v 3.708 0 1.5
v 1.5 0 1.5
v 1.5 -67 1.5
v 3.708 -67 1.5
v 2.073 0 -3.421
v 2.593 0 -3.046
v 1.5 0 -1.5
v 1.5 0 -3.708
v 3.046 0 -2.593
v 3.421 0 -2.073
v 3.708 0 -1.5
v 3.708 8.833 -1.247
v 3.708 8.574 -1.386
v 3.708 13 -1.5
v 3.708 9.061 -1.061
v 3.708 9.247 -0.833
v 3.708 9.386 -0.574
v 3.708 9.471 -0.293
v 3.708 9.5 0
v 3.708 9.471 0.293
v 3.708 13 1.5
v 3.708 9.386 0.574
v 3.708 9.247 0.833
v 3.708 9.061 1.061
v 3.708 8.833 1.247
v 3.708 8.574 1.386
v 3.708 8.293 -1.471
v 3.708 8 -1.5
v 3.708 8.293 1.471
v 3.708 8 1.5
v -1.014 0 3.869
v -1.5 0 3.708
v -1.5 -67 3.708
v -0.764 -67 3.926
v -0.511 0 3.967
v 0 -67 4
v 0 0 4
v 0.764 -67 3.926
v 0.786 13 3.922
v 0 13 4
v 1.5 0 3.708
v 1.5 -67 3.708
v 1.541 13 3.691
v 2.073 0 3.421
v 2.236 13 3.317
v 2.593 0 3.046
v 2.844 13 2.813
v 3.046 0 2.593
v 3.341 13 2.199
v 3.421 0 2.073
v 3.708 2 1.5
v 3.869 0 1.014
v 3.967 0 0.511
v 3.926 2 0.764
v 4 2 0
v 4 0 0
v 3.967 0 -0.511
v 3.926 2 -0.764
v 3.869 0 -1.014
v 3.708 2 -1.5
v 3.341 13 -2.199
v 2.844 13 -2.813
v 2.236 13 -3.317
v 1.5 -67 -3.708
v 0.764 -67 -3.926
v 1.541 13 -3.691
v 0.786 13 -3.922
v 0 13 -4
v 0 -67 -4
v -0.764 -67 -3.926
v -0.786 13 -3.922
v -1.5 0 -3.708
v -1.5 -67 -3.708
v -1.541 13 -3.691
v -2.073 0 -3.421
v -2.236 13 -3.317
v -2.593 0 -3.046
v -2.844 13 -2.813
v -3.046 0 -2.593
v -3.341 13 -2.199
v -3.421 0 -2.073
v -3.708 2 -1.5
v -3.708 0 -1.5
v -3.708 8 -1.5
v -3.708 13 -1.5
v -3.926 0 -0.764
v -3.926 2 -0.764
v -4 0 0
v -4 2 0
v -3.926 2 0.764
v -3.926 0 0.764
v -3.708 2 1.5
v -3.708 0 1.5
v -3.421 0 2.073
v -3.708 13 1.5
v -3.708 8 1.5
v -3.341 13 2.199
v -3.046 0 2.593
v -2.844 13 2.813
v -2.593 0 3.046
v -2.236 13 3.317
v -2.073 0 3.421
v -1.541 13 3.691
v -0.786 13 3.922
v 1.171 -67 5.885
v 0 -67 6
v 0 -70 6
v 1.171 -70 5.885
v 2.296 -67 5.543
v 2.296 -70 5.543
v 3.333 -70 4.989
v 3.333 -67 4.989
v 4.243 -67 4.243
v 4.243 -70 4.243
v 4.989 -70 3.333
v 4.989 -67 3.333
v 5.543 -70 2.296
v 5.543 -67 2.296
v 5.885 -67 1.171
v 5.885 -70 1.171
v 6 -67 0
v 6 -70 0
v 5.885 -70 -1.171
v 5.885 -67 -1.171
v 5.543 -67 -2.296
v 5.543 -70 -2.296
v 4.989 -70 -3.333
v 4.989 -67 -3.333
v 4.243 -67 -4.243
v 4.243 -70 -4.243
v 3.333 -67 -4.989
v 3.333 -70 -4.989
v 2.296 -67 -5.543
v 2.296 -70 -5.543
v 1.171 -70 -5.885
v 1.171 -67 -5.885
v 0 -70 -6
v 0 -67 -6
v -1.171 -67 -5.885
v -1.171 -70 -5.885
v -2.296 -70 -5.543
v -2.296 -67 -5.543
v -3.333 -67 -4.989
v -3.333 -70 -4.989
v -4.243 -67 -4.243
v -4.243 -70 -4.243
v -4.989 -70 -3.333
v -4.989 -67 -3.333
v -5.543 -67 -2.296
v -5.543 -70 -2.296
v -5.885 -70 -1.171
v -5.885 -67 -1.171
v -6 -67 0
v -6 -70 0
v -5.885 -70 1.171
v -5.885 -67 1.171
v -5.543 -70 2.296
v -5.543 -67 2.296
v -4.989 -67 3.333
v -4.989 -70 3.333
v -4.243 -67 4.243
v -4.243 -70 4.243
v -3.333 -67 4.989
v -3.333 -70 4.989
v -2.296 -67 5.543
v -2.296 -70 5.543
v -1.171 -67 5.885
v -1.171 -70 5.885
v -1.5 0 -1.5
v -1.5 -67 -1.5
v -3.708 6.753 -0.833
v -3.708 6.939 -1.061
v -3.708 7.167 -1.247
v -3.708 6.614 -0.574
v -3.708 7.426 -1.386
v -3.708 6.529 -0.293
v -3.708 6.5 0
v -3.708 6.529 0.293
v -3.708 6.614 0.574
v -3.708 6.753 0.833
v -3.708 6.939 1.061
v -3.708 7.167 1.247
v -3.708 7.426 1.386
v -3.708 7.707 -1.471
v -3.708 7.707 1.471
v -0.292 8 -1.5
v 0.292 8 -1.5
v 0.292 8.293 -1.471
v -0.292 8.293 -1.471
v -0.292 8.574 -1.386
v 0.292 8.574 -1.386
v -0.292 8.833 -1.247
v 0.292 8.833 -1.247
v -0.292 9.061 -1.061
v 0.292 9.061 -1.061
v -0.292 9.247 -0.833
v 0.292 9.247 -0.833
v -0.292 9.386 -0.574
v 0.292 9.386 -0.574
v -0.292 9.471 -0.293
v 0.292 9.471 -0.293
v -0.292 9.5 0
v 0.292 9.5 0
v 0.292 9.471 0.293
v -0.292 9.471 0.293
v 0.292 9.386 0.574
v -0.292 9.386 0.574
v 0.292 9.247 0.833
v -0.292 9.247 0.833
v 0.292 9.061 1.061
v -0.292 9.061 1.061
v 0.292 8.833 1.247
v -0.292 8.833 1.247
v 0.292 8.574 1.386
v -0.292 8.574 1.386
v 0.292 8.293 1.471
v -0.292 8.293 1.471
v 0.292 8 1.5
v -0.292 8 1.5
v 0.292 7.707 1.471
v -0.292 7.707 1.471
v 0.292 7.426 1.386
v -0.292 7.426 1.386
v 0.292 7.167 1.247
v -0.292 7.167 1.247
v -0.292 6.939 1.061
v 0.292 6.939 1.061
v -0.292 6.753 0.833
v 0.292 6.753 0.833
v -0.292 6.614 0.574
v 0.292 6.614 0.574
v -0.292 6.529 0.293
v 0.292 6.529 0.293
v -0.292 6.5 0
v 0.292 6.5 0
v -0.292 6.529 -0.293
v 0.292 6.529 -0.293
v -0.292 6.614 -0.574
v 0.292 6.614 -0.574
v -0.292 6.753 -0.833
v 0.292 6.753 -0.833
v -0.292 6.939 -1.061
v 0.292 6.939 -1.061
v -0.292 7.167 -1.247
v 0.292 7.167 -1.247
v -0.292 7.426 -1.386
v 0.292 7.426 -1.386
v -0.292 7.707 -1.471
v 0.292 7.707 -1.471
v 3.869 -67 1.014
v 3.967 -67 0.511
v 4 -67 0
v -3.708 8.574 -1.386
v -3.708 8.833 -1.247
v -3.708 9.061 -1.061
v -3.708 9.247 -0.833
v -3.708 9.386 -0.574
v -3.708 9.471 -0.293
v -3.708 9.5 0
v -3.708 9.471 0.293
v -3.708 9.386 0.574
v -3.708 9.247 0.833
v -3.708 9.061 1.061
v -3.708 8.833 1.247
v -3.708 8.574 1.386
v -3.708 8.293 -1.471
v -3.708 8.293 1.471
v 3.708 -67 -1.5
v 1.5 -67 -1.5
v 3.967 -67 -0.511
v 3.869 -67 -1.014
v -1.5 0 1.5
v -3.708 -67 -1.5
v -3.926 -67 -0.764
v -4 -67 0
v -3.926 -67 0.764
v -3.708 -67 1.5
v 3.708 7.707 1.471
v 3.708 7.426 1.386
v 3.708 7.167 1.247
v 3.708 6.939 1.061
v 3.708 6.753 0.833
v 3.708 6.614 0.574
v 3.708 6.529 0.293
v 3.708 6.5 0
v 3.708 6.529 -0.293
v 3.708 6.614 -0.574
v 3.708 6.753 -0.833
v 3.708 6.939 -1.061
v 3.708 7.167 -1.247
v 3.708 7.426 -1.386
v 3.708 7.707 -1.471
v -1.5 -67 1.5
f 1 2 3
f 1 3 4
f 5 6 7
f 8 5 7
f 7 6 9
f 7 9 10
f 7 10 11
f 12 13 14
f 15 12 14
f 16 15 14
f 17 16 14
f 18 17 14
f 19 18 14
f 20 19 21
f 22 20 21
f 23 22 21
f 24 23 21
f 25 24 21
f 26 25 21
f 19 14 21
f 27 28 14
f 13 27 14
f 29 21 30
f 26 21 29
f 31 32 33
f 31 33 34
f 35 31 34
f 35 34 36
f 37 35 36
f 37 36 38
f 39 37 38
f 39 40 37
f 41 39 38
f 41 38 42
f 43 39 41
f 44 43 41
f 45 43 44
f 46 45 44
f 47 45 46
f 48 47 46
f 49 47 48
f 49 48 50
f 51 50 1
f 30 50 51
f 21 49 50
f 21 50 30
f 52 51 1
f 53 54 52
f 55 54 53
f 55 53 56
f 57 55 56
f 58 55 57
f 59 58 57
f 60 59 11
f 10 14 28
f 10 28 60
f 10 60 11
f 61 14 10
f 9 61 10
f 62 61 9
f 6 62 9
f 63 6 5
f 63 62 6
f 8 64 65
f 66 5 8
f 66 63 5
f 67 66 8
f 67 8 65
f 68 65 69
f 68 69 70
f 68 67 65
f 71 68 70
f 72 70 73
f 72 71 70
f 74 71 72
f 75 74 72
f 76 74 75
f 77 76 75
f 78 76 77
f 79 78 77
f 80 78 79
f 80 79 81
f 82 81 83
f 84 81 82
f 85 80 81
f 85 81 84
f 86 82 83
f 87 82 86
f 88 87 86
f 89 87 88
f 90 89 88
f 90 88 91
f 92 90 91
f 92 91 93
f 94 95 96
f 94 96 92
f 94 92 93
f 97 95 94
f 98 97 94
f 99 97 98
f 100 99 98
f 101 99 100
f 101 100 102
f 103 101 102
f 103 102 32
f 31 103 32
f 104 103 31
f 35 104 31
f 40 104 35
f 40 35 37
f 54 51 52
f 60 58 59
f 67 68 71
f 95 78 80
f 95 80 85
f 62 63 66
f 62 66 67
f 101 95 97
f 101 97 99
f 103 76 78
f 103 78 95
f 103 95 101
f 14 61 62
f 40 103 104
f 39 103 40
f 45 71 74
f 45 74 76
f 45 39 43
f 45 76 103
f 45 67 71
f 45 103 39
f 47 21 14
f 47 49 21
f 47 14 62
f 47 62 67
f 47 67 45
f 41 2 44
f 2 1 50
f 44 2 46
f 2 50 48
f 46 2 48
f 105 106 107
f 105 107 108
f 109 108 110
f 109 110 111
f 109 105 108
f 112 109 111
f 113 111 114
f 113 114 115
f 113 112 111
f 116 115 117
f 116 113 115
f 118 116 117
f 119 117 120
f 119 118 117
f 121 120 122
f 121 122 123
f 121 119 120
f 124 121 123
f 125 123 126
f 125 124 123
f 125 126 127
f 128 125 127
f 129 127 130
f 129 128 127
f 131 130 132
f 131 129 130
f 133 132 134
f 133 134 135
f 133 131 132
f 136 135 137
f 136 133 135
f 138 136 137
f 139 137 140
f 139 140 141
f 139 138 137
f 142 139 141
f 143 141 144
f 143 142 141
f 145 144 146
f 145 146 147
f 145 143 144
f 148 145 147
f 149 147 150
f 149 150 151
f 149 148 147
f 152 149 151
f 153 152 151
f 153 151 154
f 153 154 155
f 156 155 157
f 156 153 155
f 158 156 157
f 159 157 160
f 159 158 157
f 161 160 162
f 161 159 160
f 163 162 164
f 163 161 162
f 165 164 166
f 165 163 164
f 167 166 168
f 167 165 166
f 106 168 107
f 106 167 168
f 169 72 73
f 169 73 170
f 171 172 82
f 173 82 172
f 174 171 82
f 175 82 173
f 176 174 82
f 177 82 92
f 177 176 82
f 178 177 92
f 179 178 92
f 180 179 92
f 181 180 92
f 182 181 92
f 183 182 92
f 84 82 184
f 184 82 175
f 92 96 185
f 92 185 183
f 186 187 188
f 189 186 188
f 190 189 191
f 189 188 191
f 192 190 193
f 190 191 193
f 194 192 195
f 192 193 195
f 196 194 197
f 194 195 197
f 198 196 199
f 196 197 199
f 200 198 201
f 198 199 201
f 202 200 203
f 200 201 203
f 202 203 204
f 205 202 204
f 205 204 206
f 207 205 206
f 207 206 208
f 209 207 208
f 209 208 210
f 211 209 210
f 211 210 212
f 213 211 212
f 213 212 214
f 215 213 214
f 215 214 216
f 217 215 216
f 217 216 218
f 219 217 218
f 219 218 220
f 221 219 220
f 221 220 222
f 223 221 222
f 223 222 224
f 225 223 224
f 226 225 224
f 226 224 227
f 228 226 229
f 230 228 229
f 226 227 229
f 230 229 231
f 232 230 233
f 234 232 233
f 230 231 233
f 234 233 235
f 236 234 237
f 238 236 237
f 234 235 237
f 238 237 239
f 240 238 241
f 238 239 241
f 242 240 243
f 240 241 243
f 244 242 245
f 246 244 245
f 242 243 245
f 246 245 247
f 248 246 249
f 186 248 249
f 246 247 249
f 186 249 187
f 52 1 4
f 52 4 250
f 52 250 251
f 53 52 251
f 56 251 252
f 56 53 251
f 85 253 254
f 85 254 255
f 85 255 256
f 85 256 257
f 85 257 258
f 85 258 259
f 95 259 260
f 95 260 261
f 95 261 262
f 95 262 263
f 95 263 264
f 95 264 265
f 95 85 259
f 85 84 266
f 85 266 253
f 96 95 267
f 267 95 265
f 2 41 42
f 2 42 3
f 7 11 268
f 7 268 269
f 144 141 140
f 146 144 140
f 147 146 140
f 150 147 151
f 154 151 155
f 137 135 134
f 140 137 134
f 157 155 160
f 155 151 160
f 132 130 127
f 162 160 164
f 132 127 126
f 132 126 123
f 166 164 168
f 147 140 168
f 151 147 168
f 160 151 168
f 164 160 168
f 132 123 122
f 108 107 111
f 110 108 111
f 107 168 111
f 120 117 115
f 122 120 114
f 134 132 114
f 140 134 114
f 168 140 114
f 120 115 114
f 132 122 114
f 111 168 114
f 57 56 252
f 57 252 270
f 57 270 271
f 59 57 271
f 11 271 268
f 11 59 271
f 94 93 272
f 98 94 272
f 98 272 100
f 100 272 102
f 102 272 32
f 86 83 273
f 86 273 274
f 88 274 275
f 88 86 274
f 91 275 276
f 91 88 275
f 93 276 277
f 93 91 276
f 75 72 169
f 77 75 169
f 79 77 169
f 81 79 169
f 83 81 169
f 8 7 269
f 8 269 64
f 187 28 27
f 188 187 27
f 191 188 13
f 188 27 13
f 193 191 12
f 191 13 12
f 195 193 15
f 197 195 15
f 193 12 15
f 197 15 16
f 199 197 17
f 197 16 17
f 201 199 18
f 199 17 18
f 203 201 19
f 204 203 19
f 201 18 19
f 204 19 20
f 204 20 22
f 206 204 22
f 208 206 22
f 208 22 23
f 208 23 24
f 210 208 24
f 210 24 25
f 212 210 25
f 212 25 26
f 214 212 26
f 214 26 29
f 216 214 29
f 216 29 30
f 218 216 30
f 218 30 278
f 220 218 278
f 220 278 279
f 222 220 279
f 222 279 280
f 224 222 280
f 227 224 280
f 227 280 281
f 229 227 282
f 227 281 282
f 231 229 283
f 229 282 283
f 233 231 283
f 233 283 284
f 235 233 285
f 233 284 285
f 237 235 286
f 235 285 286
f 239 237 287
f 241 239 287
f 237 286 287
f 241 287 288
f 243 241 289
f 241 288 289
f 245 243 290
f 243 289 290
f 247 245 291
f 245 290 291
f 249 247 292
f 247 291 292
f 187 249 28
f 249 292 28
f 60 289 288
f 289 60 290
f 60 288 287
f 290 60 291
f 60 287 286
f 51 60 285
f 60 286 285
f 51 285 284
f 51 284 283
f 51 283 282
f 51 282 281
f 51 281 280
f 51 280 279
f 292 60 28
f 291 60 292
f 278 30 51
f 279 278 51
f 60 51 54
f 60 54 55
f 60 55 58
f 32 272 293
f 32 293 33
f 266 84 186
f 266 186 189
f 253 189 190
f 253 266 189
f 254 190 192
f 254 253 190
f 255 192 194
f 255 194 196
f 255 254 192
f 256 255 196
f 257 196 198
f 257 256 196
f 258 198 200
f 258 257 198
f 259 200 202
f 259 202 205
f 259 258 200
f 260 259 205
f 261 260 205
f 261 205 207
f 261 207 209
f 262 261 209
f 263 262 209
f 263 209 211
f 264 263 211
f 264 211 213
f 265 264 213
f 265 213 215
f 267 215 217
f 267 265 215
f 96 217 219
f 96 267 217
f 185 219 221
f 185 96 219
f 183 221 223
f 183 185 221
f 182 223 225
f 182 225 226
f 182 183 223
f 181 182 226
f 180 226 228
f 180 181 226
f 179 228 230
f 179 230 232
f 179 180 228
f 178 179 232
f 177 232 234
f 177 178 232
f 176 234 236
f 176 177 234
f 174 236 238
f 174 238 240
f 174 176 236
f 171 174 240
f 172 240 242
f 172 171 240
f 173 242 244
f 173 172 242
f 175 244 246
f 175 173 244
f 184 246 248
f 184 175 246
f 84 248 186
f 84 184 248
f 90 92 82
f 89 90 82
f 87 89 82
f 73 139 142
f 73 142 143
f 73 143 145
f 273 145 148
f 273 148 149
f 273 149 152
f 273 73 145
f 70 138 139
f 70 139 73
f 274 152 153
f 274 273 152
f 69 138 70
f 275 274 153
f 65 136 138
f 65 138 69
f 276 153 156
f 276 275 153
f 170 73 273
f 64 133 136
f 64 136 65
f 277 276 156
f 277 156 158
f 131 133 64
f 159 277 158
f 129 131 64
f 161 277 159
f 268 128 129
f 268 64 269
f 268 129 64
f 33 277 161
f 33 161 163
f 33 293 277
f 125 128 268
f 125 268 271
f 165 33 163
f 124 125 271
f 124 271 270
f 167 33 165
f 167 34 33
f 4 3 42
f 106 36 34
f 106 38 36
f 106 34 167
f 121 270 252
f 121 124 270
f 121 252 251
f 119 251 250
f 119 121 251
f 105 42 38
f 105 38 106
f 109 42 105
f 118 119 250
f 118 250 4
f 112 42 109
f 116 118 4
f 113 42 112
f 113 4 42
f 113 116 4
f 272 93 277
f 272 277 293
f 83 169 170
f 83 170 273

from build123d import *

# Parameters (mm, degrees)
BOSS_EXTRUDE1_DEPTH = 67
BOSS_EXTRUDE2_START = 13
SKETCH1_3_R         = 4
BOSS_EXTRUDE2_DEPTH = 13
BOSS_EXTRUDE3_START = -67
SKETCH1_4_R         = 6
BOSS_EXTRUDE3_DEPTH = 3
CUT_EXTRUDE1_DEPTH  = 11
SKETCH3_R           = 1.5
CUT_EXTRUDE2_DEPTH  = 4


with BuildPart() as part:
    # Sketch1 → Boss-Extrude1 (new body)
    with BuildSketch(Plane(origin=(0, 0, 0), x_dir=(1, 0, 0), z_dir=(0, 1, 0))):
        with BuildLine():
            Line((1.5, 1.5), (1.5, 3.708099244))
            ThreePointArc((1.5, 3.708099244), (0, 4), (-1.5, 3.708099244))
            Line((-1.5, 3.708099244), (-1.5, 1.5))
            Line((-1.5, 1.5), (-3.708099244, 1.5))
            ThreePointArc((-3.708099244, 1.5), (-4, 0), (-3.708099244, -1.5))
            Line((-3.708099244, -1.5), (-1.5, -1.5))
            Line((-1.5, -1.5), (-1.5, -3.708099244))
            ThreePointArc((-1.5, -3.708099244), (0, -4), (1.5, -3.708099244))
            Line((1.5, -3.708099244), (1.5, -1.5))
            Line((1.5, -1.5), (3.708099244, -1.5))
            ThreePointArc((3.708099244, -1.5), (3.92634671, -0.76406905), (4, 0))
            ThreePointArc((4, 0), (3.92634671, 0.76406905), (3.708099244, 1.5))
            Line((3.708099244, 1.5), (1.5, 1.5))
        make_face()
    extrude(amount=-BOSS_EXTRUDE1_DEPTH)

    # Sketch1<3> → Boss-Extrude2 (add)
    with BuildSketch(Plane(origin=(0, 0, 0), x_dir=(1, 0, 0), z_dir=(0, 1, 0)).offset(BOSS_EXTRUDE2_START)):
        Circle(SKETCH1_3_R)
    extrude(amount=-BOSS_EXTRUDE2_DEPTH)

    # Sketch1<4> → Boss-Extrude3 (add)
    with BuildSketch(Plane(origin=(0, 0, 0), x_dir=(1, 0, 0), z_dir=(0, 1, 0)).offset(BOSS_EXTRUDE3_START)):
        Circle(SKETCH1_4_R)
    extrude(amount=-BOSS_EXTRUDE3_DEPTH)

    # Sketch2 → Cut-Extrude1 (cut)
    with BuildSketch(Plane(origin=(0, 13, 0), x_dir=(1, 0, 0), z_dir=(0, 1, 0))):
        with BuildLine():
            Line((3.708099244, 1.5), (3.708099244, -1.5))
            ThreePointArc((3.708099244, -1.5), (4, 0), (3.708099244, 1.5))
        make_face()
    cut_extrude1 = extrude(amount=-CUT_EXTRUDE1_DEPTH, mode=Mode.SUBTRACT)

    # Sketch3 → Cut-Extrude2 (cut)
    with BuildSketch(Plane(origin=(3.708099244, 0, 0), x_dir=(0, 0, -1), z_dir=(1, 0, 0))):
        with Locations((0, 8)):
            Circle(SKETCH3_R)
    cut_extrude2 = extrude(amount=-CUT_EXTRUDE2_DEPTH, mode=Mode.SUBTRACT)

    # Mirror1: Cut-Extrude1, Cut-Extrude2 across plane
    add(cut_extrude1.mirror(Plane(origin=(0, 0, 0), x_dir=(0, 0, 1), z_dir=(1, 0, 0))), mode=Mode.SUBTRACT)
    add(cut_extrude2.mirror(Plane(origin=(0, 0, 0), x_dir=(0, 0, 1), z_dir=(1, 0, 0))), mode=Mode.SUBTRACT)


solid = part.part
